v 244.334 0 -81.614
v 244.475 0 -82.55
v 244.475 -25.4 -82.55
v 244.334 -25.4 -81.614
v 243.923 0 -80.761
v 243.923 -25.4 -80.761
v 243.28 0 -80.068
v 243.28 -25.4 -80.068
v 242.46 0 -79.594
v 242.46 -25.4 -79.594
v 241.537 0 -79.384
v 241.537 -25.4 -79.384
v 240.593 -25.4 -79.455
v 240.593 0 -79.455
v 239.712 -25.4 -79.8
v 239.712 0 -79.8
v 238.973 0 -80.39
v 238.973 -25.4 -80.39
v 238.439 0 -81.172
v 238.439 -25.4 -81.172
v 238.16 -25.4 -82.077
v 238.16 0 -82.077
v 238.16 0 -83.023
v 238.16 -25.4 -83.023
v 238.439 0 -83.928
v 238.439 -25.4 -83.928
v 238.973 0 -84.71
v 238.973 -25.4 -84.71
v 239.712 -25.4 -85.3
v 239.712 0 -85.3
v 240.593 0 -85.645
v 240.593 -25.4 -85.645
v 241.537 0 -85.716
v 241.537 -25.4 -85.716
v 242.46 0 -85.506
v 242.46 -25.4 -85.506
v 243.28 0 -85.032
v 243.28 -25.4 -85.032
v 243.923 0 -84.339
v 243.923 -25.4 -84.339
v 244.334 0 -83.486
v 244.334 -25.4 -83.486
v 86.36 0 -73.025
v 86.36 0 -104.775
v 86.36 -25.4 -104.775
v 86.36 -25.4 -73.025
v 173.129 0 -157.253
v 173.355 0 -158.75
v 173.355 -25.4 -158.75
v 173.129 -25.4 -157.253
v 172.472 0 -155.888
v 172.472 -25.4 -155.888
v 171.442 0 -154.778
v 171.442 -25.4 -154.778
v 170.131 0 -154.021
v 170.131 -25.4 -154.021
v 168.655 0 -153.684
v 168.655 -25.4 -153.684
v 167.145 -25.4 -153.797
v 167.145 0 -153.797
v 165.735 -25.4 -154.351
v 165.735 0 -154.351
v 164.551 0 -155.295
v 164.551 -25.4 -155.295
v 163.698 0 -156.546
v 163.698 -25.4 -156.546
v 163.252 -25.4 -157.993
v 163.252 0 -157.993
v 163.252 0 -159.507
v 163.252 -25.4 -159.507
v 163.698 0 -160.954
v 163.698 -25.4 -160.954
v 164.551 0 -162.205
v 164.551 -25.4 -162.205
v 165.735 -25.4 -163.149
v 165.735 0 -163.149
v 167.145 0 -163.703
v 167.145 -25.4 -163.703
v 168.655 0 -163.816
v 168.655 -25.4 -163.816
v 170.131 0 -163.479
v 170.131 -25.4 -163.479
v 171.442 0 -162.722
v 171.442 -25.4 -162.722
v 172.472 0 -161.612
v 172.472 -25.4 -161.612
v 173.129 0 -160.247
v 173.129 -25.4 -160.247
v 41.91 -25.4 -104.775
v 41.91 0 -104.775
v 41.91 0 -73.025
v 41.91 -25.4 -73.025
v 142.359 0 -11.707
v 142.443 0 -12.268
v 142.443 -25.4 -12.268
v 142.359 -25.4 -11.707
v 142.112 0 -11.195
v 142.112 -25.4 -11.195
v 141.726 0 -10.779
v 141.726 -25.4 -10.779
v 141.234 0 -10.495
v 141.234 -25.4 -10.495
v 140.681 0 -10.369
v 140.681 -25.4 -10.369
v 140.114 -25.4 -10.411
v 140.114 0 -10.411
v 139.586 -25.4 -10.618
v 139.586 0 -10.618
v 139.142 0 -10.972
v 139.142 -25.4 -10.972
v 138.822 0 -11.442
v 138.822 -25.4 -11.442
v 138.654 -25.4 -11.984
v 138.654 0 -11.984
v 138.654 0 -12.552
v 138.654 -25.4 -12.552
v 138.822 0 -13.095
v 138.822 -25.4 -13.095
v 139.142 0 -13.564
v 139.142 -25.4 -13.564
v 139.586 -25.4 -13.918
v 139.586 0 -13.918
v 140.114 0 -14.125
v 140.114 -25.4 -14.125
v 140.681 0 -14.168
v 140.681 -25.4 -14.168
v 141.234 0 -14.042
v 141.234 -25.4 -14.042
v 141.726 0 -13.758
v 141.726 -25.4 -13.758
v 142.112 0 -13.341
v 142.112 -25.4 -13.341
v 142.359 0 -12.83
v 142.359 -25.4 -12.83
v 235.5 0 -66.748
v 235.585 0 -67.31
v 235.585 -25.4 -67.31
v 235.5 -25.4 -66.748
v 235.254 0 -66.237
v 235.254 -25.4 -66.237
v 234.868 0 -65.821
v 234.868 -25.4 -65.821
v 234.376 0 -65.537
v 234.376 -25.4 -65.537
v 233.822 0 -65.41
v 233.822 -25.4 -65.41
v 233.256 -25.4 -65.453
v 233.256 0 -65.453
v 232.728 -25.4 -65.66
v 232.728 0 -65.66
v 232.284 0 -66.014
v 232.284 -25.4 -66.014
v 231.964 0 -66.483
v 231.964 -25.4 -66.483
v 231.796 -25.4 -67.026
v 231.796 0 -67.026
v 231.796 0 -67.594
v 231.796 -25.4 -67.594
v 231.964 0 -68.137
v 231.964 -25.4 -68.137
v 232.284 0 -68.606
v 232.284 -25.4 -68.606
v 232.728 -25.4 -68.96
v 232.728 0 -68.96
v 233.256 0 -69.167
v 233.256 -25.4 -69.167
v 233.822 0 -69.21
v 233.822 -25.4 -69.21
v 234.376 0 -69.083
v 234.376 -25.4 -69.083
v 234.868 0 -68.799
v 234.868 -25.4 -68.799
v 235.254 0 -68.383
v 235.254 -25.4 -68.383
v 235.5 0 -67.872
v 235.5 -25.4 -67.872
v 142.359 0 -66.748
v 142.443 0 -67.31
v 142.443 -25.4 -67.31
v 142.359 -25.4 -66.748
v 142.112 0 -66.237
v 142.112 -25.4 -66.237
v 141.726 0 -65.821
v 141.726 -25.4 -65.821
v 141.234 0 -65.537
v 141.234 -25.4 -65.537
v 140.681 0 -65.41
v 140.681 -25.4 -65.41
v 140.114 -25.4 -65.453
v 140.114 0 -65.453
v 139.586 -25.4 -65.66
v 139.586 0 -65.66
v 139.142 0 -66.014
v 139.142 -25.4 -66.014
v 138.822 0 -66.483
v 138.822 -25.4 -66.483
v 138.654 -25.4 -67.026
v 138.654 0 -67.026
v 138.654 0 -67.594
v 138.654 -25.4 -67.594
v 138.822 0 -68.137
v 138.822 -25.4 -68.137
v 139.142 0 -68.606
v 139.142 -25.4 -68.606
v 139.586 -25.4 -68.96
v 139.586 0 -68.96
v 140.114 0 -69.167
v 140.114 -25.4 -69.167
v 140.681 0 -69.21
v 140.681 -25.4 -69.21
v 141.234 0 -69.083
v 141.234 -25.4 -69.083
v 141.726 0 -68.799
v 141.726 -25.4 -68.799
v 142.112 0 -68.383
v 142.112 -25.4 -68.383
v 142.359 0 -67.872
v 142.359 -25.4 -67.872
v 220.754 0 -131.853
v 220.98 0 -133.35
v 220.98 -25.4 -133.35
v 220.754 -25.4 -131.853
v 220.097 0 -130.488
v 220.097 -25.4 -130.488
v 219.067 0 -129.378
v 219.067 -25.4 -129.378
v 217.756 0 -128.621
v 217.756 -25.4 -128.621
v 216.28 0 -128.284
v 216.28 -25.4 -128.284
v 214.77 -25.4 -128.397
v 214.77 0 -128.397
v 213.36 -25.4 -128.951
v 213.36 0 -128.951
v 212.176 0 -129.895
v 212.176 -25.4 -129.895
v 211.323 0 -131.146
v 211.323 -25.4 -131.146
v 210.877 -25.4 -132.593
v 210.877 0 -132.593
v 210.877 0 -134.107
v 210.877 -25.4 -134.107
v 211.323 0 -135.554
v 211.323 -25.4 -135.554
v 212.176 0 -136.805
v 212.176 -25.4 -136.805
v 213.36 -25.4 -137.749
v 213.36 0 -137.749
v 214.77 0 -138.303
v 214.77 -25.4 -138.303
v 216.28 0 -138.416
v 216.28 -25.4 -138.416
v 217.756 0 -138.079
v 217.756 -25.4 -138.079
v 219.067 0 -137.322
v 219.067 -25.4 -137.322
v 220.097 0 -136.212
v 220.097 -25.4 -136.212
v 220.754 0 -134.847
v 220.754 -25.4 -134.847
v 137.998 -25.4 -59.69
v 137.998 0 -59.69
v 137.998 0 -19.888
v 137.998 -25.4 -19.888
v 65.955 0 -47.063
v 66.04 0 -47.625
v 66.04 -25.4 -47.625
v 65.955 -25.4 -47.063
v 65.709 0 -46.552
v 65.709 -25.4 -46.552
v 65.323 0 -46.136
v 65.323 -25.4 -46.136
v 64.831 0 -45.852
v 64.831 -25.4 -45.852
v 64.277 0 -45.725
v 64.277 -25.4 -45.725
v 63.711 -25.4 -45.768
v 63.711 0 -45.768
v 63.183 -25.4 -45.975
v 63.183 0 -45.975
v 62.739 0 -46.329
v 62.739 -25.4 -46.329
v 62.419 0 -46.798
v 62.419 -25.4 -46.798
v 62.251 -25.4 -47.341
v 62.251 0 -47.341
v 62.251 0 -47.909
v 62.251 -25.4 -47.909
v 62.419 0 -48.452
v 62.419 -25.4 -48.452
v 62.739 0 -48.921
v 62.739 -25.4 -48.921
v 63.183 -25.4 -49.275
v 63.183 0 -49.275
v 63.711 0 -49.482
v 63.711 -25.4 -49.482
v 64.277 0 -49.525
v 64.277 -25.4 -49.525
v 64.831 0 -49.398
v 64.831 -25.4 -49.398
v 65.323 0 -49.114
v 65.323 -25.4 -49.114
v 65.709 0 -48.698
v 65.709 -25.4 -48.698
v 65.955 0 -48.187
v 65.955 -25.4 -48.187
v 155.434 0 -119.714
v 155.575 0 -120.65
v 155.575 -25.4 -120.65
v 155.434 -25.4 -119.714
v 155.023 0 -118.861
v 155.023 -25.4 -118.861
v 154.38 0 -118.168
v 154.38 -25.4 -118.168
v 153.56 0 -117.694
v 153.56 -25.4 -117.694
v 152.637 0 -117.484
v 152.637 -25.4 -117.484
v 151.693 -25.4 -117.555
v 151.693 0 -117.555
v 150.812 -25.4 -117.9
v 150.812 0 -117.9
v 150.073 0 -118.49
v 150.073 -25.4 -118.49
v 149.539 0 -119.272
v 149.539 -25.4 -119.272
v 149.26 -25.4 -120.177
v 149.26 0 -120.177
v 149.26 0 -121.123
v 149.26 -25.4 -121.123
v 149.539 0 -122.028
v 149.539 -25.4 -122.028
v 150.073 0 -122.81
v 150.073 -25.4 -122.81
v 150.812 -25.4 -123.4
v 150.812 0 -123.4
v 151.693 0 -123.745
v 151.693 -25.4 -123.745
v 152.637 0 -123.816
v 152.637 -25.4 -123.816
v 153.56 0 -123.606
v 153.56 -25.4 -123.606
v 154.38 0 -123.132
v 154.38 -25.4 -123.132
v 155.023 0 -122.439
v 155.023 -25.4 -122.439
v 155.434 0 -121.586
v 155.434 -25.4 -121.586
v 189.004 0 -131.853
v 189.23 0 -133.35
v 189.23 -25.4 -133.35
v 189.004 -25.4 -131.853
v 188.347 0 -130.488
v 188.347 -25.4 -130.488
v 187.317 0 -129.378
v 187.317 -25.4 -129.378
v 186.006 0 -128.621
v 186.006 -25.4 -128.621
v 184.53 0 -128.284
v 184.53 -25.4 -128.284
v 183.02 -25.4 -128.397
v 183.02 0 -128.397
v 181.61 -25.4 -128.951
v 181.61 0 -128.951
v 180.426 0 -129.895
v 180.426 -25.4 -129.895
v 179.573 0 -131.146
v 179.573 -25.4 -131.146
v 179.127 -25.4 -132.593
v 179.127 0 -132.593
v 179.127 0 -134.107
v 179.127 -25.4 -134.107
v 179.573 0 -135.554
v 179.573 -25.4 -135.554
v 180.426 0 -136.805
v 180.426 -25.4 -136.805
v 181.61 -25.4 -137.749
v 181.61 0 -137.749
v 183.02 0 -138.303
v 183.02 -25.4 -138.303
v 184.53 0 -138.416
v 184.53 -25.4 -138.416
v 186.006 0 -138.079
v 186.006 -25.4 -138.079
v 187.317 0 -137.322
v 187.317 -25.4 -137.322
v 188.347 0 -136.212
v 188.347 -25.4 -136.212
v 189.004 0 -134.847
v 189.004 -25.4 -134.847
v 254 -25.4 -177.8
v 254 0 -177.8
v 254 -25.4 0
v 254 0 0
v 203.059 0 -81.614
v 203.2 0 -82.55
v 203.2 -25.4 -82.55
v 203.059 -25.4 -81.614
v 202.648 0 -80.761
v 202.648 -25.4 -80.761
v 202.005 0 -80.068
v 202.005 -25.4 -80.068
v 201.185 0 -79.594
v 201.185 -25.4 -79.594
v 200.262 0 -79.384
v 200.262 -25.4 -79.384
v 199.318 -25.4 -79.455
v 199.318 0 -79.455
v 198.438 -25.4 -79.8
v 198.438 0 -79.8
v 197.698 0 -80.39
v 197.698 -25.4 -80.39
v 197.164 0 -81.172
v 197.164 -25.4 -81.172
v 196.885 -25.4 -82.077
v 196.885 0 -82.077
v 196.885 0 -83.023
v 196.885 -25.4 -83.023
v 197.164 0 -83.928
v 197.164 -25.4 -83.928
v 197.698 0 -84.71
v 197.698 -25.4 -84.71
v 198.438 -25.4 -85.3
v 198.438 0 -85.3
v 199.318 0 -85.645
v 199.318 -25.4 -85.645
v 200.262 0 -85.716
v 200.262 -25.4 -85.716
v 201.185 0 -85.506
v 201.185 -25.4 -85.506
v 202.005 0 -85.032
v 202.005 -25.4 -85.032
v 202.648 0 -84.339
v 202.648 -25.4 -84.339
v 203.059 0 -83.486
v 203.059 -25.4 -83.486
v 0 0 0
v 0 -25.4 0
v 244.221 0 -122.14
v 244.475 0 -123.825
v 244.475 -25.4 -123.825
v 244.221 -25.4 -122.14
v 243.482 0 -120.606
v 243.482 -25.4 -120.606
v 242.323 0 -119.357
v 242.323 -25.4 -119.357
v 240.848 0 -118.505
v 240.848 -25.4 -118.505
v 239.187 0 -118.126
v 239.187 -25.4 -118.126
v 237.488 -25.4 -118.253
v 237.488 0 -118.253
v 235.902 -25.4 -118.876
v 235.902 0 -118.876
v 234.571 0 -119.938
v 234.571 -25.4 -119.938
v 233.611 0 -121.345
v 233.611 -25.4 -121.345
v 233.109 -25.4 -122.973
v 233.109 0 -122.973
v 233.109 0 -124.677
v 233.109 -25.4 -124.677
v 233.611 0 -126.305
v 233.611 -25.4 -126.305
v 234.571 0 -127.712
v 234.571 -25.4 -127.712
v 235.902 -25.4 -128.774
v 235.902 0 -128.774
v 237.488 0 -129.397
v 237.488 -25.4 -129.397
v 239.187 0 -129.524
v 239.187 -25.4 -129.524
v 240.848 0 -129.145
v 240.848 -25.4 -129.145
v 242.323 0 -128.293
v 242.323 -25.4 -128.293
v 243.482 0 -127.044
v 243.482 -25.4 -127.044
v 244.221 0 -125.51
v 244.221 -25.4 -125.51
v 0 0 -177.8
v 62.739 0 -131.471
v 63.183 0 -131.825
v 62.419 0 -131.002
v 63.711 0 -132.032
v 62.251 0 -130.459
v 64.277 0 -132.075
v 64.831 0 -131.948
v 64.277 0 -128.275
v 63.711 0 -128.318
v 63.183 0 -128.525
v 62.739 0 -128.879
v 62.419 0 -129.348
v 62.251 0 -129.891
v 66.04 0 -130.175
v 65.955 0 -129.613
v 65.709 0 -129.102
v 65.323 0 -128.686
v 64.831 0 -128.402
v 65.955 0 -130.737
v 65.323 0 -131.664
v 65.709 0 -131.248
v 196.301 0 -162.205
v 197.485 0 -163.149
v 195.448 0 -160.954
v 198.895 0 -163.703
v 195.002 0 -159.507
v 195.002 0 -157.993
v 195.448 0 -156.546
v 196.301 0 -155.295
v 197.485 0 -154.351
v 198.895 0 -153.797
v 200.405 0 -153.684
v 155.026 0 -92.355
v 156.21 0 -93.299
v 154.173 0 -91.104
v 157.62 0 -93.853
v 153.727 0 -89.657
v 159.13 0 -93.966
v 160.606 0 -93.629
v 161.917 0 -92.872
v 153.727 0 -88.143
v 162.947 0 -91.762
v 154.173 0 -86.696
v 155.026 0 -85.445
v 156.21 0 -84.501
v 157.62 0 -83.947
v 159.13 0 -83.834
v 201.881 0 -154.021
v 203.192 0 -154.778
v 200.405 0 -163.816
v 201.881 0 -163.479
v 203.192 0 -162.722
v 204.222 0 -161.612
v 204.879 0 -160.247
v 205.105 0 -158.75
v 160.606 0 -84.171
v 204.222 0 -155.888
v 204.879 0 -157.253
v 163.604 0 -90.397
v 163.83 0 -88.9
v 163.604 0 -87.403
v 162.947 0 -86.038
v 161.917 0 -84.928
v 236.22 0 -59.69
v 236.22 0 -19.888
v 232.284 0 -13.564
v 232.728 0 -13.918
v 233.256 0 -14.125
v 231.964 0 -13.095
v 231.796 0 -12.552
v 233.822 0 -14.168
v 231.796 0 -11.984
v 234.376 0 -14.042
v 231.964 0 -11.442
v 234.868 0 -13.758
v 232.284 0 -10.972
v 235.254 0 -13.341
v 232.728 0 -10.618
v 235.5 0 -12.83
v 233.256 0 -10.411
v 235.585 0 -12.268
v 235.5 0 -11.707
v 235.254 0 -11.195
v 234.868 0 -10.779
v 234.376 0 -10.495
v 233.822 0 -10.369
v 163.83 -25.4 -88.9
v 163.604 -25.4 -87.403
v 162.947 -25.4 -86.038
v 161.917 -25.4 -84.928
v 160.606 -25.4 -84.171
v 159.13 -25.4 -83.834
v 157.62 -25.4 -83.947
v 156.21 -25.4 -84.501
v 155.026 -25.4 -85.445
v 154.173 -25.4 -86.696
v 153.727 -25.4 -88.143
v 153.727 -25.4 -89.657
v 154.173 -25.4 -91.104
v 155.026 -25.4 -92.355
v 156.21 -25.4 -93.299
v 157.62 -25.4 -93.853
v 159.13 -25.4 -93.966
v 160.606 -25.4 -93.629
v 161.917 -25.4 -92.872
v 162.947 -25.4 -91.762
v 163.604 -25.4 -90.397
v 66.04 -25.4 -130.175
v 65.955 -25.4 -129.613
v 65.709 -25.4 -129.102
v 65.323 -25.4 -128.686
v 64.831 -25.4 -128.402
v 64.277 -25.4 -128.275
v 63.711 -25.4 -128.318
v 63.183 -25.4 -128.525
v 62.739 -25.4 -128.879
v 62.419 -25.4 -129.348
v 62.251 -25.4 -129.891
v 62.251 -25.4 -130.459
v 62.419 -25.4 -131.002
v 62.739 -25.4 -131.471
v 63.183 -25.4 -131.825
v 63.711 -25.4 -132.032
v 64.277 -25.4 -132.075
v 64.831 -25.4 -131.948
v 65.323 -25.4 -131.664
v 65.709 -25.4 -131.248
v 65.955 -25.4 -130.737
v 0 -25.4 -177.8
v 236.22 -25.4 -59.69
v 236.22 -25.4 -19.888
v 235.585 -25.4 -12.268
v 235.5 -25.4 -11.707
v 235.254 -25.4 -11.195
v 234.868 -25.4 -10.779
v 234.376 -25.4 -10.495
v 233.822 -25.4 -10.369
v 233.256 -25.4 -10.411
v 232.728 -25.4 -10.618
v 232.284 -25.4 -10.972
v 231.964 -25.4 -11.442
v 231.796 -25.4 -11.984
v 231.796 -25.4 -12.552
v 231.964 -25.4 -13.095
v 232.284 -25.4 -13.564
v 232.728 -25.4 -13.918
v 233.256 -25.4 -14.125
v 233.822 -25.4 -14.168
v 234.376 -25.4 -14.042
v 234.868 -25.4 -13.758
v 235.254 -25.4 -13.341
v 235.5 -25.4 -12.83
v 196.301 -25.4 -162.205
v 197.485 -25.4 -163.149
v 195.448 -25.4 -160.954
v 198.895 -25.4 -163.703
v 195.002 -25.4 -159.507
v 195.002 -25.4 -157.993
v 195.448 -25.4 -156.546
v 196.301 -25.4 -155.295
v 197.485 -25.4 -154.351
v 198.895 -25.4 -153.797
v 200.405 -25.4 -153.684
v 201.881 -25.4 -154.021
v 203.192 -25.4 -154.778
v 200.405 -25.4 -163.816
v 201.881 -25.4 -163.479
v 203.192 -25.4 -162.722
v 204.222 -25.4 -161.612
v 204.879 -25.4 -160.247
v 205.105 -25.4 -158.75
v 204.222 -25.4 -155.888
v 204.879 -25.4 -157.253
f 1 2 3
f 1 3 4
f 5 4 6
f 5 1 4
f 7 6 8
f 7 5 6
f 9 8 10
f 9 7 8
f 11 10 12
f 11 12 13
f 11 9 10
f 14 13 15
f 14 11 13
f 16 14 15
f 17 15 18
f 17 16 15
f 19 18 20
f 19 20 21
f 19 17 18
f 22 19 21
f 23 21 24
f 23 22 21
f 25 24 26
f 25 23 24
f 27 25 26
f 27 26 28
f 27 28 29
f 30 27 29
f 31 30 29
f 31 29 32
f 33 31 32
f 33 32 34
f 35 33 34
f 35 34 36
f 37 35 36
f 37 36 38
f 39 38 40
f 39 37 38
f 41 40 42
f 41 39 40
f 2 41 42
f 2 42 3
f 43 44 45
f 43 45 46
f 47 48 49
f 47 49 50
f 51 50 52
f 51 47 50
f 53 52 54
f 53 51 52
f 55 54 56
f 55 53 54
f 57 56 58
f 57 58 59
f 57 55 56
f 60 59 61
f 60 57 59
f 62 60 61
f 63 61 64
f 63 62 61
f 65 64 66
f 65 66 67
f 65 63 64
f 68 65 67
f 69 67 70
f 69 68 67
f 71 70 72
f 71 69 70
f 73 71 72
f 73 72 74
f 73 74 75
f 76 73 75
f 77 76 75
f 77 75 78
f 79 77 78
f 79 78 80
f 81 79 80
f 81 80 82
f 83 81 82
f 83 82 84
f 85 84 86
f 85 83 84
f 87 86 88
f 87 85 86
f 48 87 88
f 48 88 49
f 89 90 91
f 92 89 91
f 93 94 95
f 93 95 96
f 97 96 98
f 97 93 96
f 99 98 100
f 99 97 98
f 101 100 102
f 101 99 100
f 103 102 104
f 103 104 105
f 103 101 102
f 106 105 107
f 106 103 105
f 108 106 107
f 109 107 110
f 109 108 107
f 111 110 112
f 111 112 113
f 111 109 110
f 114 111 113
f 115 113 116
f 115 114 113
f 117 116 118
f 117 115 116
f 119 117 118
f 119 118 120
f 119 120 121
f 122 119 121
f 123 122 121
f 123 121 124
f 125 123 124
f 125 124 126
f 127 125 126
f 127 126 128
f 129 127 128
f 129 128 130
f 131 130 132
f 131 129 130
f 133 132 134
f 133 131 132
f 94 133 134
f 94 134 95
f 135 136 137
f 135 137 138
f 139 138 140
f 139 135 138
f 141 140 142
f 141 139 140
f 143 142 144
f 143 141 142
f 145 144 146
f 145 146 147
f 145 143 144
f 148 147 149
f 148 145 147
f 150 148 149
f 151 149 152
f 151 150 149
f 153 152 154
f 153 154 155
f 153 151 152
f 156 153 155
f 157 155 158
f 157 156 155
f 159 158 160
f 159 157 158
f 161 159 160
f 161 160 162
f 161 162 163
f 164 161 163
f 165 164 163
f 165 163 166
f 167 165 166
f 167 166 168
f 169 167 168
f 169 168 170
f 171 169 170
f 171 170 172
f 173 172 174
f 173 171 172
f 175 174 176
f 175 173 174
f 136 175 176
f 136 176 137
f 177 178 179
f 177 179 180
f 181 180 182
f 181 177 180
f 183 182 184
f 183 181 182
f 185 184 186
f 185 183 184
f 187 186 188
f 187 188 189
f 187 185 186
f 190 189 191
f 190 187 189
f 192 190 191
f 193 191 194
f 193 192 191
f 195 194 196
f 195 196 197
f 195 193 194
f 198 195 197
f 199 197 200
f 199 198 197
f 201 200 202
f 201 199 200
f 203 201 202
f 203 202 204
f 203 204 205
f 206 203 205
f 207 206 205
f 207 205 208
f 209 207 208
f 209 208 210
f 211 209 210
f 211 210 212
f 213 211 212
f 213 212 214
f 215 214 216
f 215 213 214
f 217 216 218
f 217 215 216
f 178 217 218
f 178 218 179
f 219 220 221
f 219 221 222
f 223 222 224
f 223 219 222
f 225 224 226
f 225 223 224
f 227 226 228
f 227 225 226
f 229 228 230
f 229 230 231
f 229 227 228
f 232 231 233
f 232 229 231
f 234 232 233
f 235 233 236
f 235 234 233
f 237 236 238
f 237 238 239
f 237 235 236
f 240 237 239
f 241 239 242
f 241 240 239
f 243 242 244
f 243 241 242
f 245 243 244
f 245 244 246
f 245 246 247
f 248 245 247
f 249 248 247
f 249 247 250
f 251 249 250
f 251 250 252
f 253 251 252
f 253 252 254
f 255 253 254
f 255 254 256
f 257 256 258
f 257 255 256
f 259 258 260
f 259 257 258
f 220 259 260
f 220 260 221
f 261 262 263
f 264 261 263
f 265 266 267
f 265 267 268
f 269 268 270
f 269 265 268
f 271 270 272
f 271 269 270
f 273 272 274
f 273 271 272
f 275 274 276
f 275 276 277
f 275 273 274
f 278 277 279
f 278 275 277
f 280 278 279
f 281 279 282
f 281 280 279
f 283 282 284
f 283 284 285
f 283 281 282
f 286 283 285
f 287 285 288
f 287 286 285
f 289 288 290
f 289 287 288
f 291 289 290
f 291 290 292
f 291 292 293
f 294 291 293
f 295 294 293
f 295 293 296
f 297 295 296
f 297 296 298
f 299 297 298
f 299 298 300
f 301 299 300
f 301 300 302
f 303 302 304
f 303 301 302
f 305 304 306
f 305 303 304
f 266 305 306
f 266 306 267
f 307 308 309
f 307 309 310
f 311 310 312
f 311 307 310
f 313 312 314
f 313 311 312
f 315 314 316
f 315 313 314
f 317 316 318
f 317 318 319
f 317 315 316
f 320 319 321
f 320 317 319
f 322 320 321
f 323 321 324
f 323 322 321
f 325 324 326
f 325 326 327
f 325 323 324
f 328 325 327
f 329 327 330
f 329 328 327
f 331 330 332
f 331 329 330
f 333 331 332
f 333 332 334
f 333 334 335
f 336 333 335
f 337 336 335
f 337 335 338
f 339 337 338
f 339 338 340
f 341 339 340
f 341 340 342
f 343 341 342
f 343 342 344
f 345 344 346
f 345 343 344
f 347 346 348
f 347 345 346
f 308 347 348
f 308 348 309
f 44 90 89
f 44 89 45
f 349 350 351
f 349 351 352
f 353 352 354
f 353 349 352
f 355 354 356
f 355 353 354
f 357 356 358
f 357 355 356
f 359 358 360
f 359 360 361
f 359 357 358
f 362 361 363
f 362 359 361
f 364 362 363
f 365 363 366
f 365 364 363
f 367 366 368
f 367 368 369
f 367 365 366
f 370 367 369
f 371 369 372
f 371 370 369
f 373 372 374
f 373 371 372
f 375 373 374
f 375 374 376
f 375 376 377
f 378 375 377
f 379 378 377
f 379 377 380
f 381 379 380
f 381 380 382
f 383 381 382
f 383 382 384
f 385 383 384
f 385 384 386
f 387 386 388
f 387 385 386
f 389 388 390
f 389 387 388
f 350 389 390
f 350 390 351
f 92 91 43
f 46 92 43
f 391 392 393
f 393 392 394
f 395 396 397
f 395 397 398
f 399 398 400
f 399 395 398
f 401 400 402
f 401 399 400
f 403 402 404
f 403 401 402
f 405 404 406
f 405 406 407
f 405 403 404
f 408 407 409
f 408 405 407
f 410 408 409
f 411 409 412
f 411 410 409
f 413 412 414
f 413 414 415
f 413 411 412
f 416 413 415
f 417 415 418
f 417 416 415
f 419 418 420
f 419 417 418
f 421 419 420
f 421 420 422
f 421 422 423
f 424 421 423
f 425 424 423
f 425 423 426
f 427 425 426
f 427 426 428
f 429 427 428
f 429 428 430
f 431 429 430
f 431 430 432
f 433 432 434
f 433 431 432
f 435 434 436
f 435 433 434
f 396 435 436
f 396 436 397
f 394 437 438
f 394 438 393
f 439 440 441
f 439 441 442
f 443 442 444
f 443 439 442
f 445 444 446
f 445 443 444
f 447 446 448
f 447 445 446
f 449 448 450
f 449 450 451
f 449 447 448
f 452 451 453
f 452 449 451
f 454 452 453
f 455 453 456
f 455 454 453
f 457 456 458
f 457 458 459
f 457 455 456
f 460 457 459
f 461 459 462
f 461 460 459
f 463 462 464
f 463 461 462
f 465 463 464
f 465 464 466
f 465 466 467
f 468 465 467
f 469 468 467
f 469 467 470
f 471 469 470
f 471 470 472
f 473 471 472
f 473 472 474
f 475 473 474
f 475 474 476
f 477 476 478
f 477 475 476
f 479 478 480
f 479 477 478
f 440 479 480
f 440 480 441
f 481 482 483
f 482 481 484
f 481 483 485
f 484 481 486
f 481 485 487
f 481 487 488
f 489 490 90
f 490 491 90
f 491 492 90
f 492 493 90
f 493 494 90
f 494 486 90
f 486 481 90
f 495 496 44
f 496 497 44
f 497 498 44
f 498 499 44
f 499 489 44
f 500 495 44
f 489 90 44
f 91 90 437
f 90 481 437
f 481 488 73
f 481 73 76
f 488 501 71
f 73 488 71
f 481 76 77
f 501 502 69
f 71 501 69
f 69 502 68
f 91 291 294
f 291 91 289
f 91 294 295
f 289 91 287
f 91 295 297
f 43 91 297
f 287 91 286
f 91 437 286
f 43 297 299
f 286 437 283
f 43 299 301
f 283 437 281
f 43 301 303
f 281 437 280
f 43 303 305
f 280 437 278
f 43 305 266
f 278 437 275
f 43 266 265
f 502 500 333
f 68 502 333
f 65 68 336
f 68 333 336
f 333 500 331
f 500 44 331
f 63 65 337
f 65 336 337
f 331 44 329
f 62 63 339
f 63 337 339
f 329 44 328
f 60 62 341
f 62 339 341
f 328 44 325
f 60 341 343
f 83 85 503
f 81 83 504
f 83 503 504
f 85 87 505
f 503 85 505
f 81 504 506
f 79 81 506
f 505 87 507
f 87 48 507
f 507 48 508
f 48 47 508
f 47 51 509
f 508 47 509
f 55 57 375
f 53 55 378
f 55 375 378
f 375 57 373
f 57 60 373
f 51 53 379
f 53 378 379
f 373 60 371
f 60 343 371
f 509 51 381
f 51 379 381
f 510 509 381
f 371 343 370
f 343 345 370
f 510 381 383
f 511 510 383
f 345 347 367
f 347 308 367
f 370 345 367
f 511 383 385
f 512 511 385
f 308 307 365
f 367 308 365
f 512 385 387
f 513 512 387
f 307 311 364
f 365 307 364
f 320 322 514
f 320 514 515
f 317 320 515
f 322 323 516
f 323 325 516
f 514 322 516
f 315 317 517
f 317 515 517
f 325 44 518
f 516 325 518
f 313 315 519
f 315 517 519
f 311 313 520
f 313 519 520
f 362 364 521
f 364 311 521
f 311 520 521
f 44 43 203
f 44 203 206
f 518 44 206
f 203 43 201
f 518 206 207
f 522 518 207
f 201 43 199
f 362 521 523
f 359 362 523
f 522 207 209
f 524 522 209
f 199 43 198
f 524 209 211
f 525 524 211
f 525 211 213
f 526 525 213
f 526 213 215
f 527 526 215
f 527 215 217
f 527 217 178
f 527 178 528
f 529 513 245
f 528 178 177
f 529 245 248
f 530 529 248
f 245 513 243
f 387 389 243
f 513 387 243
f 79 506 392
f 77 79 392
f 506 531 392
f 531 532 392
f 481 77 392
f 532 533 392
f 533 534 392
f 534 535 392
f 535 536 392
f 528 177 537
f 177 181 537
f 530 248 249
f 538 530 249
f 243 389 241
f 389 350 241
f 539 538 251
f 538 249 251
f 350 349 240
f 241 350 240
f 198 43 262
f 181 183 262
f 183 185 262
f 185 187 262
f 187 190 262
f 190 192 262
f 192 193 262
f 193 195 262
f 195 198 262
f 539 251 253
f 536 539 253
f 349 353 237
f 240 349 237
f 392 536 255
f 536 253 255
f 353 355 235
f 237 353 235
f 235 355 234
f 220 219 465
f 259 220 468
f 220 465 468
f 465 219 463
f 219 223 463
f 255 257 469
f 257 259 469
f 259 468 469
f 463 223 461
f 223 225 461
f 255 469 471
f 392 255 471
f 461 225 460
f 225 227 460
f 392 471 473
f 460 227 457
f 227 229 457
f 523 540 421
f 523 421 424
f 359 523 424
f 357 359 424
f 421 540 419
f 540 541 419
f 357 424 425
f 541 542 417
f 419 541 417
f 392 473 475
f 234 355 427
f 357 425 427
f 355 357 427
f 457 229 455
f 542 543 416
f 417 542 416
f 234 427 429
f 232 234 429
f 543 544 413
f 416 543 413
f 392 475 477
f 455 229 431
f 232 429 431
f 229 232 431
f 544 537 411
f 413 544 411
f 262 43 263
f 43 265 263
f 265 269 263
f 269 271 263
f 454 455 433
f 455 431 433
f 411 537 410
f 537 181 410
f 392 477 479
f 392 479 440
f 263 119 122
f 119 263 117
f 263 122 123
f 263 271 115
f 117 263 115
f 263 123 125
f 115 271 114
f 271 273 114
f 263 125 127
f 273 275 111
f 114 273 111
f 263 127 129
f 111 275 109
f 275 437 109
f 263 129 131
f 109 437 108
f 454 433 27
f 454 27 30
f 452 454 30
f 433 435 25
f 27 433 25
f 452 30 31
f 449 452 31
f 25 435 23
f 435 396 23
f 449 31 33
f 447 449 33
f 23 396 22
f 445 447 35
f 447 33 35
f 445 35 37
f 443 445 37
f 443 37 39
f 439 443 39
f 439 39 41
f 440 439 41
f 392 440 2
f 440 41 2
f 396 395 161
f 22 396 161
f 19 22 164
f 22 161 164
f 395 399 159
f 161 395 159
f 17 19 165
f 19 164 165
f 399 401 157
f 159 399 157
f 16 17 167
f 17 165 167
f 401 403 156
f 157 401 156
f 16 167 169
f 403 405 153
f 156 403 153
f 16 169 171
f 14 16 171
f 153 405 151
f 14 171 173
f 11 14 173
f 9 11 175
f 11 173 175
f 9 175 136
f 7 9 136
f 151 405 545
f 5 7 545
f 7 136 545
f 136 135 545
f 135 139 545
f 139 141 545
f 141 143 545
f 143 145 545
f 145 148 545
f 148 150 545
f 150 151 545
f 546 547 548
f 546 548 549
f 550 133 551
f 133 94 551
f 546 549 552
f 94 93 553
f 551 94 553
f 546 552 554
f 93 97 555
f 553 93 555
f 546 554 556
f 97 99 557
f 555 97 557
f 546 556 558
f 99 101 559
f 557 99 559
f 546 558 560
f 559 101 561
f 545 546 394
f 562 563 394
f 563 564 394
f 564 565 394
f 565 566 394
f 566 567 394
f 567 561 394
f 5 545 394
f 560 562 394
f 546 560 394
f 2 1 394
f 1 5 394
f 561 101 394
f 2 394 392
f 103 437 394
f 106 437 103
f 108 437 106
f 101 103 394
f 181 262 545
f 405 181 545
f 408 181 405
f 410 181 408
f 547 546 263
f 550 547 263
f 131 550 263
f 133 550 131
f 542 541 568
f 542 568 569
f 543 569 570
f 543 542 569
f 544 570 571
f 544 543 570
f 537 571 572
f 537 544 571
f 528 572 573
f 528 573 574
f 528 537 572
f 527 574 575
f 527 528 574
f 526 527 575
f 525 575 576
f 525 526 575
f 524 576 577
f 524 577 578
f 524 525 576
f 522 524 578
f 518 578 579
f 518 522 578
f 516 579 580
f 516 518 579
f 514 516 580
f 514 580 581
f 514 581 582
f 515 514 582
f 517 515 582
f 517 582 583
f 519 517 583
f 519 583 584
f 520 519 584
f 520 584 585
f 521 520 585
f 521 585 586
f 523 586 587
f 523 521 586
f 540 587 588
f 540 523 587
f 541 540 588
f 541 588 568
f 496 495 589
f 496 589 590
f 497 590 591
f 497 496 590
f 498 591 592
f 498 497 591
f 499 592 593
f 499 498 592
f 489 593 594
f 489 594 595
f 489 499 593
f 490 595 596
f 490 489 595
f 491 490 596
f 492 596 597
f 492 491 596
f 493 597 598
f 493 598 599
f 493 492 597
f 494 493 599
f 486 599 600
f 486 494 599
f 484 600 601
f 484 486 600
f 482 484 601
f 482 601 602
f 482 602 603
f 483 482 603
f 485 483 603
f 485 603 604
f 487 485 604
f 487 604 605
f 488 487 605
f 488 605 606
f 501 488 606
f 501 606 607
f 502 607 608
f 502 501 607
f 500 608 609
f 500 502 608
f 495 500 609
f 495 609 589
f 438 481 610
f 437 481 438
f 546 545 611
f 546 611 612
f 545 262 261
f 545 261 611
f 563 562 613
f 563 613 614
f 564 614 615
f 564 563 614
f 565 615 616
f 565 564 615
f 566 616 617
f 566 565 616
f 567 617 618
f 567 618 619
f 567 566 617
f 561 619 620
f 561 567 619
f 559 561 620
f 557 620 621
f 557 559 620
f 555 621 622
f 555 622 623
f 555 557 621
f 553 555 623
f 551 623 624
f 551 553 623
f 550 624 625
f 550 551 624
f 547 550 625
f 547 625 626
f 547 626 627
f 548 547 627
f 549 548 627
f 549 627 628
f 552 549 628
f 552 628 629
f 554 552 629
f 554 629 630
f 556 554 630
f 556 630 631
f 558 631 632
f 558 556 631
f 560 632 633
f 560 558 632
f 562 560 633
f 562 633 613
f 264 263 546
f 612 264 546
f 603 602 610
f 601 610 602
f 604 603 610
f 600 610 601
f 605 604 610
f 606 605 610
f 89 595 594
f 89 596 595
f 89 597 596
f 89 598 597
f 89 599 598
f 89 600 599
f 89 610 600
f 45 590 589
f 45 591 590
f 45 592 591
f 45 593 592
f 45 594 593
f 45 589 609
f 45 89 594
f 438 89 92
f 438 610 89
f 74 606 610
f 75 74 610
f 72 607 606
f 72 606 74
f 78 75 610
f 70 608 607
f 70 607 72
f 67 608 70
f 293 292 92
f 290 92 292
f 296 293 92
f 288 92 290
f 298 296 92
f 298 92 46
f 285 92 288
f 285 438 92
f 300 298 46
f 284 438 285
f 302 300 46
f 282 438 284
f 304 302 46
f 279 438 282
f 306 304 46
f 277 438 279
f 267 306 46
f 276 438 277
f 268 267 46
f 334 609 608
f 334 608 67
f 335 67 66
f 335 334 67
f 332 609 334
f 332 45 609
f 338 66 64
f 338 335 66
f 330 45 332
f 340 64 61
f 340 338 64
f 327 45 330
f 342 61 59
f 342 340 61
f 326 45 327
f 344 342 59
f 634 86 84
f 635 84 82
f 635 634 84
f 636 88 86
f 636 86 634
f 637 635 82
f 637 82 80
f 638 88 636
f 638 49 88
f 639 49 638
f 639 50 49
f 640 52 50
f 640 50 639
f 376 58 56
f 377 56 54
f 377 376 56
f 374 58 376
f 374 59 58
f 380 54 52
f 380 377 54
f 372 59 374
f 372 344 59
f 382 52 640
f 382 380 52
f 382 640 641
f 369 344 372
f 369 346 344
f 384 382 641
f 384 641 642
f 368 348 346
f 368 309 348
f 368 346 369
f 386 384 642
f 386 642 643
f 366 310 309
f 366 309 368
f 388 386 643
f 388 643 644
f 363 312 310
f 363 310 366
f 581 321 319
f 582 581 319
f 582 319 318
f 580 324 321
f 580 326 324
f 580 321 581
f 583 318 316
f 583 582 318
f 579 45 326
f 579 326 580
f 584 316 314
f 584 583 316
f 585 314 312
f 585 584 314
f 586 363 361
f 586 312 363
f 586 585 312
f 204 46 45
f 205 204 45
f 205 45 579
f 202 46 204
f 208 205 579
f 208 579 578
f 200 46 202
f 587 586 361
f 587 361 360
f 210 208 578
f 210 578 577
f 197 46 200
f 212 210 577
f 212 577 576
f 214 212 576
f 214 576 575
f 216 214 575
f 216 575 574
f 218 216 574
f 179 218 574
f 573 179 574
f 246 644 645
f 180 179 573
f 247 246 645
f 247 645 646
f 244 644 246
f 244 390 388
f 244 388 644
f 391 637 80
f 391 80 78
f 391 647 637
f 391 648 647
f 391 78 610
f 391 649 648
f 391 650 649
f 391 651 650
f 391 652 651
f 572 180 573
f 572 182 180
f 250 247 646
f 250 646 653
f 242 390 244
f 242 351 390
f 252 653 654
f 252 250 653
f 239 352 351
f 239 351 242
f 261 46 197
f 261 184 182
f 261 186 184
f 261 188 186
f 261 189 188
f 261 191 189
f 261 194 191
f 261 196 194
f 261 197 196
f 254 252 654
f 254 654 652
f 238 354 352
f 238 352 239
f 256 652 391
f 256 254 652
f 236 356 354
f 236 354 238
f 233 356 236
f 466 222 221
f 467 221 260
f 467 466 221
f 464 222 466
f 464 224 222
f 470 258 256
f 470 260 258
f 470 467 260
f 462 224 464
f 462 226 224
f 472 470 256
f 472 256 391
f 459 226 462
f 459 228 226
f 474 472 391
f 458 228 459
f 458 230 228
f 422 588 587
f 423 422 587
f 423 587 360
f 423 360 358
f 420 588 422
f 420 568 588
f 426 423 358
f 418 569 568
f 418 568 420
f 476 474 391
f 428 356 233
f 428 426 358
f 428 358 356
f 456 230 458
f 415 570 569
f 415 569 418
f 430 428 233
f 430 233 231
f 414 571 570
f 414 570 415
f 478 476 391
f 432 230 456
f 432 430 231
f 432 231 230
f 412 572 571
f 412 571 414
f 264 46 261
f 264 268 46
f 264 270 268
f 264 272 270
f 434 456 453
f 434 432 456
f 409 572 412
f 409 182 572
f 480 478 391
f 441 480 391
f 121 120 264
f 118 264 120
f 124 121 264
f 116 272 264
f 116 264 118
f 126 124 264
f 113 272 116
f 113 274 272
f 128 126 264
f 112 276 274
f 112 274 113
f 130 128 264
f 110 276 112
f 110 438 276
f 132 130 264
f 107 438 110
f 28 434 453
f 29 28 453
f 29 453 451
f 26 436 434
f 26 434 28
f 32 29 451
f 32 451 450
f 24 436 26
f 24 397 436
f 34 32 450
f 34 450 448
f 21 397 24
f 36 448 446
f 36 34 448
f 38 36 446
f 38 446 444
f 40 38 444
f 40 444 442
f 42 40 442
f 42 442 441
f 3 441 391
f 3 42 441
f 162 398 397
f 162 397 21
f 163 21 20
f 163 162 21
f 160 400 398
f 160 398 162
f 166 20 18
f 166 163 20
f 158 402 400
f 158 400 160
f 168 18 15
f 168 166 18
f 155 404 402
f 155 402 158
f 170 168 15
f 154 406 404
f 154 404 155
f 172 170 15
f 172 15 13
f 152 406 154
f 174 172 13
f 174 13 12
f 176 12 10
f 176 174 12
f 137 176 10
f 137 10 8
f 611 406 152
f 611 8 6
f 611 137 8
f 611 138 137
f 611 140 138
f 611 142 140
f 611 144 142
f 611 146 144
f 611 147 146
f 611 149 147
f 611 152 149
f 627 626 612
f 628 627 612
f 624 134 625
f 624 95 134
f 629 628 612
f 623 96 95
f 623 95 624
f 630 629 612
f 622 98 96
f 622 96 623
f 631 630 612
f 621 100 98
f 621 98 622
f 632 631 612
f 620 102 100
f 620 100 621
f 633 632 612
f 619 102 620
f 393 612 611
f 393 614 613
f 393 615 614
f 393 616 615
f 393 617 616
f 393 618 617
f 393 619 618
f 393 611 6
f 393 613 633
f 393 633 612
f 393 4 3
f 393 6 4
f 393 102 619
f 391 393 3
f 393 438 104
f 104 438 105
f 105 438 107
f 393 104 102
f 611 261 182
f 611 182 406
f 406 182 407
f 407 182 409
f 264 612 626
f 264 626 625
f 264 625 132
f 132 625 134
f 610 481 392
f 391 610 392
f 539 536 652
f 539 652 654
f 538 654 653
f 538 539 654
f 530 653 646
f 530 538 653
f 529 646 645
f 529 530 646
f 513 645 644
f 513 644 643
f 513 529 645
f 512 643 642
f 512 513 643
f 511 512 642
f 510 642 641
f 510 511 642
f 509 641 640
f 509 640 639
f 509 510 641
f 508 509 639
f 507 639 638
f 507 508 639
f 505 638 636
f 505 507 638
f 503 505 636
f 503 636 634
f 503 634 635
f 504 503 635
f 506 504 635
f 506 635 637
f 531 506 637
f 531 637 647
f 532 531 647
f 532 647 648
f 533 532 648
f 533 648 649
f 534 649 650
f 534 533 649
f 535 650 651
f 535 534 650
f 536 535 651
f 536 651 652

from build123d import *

# Parameters (mm, degrees)
F0_W     = 254
F0_H     = 177.8
F0_R     = 1.905
F0_R_2   = 5.08
F0_R_3   = 3.175
F0_R_4   = 5.715
F0_W_2   = 44.45
F0_H_2   = 31.75
F0_W_3   = 98.2218
F0_H_3   = 39.8018
F1_DEPTH = 25.4


with BuildPart() as f1:
    # F0 (on Front) → F1 (new body)
    with BuildSketch(Plane.XZ):
        with Locations((127, -88.9)):
            Rectangle(F0_W, F0_H)
        with Locations((64.135, -130.175)):
            Circle(F0_R, mode=Mode.SUBTRACT)
        with Locations((168.275, -158.75)):
            Circle(F0_R_2, mode=Mode.SUBTRACT)
        with Locations((200.025, -158.75)):
            Circle(F0_R_2, mode=Mode.SUBTRACT)
        with Locations((152.4, -120.65)):
            Circle(F0_R_3, mode=Mode.SUBTRACT)
        with Locations((184.15, -133.35)):
            Circle(F0_R_2, mode=Mode.SUBTRACT)
        with Locations((215.9, -133.35)):
            Circle(F0_R_2, mode=Mode.SUBTRACT)
        with Locations((238.76, -123.825)):
            Circle(F0_R_4, mode=Mode.SUBTRACT)
        with Locations((64.135, -88.9)):
            Rectangle(F0_W_2, F0_H_2, mode=Mode.SUBTRACT)
        with Locations((64.135, -47.625)):
            Circle(F0_R, mode=Mode.SUBTRACT)
        with Locations((140.5382, -67.31)):
            Circle(F0_R, mode=Mode.SUBTRACT)
        with Locations((158.75, -88.9)):
            Circle(F0_R_2, mode=Mode.SUBTRACT)
        with Locations((200.025, -82.55)):
            Circle(F0_R_3, mode=Mode.SUBTRACT)
        with Locations((241.3, -82.55)):
            Circle(F0_R_3, mode=Mode.SUBTRACT)
        with Locations((233.68, -67.31)):
            Circle(F0_R, mode=Mode.SUBTRACT)
        with Locations((187.1091, -39.7891)):
            Rectangle(F0_W_3, F0_H_3, mode=Mode.SUBTRACT)
        with Locations((140.5382, -12.2682)):
            Circle(F0_R, mode=Mode.SUBTRACT)
        with Locations((233.68, -12.2682)):
            Circle(F0_R, mode=Mode.SUBTRACT)
    extrude(amount=F1_DEPTH)


solid = f1.part
